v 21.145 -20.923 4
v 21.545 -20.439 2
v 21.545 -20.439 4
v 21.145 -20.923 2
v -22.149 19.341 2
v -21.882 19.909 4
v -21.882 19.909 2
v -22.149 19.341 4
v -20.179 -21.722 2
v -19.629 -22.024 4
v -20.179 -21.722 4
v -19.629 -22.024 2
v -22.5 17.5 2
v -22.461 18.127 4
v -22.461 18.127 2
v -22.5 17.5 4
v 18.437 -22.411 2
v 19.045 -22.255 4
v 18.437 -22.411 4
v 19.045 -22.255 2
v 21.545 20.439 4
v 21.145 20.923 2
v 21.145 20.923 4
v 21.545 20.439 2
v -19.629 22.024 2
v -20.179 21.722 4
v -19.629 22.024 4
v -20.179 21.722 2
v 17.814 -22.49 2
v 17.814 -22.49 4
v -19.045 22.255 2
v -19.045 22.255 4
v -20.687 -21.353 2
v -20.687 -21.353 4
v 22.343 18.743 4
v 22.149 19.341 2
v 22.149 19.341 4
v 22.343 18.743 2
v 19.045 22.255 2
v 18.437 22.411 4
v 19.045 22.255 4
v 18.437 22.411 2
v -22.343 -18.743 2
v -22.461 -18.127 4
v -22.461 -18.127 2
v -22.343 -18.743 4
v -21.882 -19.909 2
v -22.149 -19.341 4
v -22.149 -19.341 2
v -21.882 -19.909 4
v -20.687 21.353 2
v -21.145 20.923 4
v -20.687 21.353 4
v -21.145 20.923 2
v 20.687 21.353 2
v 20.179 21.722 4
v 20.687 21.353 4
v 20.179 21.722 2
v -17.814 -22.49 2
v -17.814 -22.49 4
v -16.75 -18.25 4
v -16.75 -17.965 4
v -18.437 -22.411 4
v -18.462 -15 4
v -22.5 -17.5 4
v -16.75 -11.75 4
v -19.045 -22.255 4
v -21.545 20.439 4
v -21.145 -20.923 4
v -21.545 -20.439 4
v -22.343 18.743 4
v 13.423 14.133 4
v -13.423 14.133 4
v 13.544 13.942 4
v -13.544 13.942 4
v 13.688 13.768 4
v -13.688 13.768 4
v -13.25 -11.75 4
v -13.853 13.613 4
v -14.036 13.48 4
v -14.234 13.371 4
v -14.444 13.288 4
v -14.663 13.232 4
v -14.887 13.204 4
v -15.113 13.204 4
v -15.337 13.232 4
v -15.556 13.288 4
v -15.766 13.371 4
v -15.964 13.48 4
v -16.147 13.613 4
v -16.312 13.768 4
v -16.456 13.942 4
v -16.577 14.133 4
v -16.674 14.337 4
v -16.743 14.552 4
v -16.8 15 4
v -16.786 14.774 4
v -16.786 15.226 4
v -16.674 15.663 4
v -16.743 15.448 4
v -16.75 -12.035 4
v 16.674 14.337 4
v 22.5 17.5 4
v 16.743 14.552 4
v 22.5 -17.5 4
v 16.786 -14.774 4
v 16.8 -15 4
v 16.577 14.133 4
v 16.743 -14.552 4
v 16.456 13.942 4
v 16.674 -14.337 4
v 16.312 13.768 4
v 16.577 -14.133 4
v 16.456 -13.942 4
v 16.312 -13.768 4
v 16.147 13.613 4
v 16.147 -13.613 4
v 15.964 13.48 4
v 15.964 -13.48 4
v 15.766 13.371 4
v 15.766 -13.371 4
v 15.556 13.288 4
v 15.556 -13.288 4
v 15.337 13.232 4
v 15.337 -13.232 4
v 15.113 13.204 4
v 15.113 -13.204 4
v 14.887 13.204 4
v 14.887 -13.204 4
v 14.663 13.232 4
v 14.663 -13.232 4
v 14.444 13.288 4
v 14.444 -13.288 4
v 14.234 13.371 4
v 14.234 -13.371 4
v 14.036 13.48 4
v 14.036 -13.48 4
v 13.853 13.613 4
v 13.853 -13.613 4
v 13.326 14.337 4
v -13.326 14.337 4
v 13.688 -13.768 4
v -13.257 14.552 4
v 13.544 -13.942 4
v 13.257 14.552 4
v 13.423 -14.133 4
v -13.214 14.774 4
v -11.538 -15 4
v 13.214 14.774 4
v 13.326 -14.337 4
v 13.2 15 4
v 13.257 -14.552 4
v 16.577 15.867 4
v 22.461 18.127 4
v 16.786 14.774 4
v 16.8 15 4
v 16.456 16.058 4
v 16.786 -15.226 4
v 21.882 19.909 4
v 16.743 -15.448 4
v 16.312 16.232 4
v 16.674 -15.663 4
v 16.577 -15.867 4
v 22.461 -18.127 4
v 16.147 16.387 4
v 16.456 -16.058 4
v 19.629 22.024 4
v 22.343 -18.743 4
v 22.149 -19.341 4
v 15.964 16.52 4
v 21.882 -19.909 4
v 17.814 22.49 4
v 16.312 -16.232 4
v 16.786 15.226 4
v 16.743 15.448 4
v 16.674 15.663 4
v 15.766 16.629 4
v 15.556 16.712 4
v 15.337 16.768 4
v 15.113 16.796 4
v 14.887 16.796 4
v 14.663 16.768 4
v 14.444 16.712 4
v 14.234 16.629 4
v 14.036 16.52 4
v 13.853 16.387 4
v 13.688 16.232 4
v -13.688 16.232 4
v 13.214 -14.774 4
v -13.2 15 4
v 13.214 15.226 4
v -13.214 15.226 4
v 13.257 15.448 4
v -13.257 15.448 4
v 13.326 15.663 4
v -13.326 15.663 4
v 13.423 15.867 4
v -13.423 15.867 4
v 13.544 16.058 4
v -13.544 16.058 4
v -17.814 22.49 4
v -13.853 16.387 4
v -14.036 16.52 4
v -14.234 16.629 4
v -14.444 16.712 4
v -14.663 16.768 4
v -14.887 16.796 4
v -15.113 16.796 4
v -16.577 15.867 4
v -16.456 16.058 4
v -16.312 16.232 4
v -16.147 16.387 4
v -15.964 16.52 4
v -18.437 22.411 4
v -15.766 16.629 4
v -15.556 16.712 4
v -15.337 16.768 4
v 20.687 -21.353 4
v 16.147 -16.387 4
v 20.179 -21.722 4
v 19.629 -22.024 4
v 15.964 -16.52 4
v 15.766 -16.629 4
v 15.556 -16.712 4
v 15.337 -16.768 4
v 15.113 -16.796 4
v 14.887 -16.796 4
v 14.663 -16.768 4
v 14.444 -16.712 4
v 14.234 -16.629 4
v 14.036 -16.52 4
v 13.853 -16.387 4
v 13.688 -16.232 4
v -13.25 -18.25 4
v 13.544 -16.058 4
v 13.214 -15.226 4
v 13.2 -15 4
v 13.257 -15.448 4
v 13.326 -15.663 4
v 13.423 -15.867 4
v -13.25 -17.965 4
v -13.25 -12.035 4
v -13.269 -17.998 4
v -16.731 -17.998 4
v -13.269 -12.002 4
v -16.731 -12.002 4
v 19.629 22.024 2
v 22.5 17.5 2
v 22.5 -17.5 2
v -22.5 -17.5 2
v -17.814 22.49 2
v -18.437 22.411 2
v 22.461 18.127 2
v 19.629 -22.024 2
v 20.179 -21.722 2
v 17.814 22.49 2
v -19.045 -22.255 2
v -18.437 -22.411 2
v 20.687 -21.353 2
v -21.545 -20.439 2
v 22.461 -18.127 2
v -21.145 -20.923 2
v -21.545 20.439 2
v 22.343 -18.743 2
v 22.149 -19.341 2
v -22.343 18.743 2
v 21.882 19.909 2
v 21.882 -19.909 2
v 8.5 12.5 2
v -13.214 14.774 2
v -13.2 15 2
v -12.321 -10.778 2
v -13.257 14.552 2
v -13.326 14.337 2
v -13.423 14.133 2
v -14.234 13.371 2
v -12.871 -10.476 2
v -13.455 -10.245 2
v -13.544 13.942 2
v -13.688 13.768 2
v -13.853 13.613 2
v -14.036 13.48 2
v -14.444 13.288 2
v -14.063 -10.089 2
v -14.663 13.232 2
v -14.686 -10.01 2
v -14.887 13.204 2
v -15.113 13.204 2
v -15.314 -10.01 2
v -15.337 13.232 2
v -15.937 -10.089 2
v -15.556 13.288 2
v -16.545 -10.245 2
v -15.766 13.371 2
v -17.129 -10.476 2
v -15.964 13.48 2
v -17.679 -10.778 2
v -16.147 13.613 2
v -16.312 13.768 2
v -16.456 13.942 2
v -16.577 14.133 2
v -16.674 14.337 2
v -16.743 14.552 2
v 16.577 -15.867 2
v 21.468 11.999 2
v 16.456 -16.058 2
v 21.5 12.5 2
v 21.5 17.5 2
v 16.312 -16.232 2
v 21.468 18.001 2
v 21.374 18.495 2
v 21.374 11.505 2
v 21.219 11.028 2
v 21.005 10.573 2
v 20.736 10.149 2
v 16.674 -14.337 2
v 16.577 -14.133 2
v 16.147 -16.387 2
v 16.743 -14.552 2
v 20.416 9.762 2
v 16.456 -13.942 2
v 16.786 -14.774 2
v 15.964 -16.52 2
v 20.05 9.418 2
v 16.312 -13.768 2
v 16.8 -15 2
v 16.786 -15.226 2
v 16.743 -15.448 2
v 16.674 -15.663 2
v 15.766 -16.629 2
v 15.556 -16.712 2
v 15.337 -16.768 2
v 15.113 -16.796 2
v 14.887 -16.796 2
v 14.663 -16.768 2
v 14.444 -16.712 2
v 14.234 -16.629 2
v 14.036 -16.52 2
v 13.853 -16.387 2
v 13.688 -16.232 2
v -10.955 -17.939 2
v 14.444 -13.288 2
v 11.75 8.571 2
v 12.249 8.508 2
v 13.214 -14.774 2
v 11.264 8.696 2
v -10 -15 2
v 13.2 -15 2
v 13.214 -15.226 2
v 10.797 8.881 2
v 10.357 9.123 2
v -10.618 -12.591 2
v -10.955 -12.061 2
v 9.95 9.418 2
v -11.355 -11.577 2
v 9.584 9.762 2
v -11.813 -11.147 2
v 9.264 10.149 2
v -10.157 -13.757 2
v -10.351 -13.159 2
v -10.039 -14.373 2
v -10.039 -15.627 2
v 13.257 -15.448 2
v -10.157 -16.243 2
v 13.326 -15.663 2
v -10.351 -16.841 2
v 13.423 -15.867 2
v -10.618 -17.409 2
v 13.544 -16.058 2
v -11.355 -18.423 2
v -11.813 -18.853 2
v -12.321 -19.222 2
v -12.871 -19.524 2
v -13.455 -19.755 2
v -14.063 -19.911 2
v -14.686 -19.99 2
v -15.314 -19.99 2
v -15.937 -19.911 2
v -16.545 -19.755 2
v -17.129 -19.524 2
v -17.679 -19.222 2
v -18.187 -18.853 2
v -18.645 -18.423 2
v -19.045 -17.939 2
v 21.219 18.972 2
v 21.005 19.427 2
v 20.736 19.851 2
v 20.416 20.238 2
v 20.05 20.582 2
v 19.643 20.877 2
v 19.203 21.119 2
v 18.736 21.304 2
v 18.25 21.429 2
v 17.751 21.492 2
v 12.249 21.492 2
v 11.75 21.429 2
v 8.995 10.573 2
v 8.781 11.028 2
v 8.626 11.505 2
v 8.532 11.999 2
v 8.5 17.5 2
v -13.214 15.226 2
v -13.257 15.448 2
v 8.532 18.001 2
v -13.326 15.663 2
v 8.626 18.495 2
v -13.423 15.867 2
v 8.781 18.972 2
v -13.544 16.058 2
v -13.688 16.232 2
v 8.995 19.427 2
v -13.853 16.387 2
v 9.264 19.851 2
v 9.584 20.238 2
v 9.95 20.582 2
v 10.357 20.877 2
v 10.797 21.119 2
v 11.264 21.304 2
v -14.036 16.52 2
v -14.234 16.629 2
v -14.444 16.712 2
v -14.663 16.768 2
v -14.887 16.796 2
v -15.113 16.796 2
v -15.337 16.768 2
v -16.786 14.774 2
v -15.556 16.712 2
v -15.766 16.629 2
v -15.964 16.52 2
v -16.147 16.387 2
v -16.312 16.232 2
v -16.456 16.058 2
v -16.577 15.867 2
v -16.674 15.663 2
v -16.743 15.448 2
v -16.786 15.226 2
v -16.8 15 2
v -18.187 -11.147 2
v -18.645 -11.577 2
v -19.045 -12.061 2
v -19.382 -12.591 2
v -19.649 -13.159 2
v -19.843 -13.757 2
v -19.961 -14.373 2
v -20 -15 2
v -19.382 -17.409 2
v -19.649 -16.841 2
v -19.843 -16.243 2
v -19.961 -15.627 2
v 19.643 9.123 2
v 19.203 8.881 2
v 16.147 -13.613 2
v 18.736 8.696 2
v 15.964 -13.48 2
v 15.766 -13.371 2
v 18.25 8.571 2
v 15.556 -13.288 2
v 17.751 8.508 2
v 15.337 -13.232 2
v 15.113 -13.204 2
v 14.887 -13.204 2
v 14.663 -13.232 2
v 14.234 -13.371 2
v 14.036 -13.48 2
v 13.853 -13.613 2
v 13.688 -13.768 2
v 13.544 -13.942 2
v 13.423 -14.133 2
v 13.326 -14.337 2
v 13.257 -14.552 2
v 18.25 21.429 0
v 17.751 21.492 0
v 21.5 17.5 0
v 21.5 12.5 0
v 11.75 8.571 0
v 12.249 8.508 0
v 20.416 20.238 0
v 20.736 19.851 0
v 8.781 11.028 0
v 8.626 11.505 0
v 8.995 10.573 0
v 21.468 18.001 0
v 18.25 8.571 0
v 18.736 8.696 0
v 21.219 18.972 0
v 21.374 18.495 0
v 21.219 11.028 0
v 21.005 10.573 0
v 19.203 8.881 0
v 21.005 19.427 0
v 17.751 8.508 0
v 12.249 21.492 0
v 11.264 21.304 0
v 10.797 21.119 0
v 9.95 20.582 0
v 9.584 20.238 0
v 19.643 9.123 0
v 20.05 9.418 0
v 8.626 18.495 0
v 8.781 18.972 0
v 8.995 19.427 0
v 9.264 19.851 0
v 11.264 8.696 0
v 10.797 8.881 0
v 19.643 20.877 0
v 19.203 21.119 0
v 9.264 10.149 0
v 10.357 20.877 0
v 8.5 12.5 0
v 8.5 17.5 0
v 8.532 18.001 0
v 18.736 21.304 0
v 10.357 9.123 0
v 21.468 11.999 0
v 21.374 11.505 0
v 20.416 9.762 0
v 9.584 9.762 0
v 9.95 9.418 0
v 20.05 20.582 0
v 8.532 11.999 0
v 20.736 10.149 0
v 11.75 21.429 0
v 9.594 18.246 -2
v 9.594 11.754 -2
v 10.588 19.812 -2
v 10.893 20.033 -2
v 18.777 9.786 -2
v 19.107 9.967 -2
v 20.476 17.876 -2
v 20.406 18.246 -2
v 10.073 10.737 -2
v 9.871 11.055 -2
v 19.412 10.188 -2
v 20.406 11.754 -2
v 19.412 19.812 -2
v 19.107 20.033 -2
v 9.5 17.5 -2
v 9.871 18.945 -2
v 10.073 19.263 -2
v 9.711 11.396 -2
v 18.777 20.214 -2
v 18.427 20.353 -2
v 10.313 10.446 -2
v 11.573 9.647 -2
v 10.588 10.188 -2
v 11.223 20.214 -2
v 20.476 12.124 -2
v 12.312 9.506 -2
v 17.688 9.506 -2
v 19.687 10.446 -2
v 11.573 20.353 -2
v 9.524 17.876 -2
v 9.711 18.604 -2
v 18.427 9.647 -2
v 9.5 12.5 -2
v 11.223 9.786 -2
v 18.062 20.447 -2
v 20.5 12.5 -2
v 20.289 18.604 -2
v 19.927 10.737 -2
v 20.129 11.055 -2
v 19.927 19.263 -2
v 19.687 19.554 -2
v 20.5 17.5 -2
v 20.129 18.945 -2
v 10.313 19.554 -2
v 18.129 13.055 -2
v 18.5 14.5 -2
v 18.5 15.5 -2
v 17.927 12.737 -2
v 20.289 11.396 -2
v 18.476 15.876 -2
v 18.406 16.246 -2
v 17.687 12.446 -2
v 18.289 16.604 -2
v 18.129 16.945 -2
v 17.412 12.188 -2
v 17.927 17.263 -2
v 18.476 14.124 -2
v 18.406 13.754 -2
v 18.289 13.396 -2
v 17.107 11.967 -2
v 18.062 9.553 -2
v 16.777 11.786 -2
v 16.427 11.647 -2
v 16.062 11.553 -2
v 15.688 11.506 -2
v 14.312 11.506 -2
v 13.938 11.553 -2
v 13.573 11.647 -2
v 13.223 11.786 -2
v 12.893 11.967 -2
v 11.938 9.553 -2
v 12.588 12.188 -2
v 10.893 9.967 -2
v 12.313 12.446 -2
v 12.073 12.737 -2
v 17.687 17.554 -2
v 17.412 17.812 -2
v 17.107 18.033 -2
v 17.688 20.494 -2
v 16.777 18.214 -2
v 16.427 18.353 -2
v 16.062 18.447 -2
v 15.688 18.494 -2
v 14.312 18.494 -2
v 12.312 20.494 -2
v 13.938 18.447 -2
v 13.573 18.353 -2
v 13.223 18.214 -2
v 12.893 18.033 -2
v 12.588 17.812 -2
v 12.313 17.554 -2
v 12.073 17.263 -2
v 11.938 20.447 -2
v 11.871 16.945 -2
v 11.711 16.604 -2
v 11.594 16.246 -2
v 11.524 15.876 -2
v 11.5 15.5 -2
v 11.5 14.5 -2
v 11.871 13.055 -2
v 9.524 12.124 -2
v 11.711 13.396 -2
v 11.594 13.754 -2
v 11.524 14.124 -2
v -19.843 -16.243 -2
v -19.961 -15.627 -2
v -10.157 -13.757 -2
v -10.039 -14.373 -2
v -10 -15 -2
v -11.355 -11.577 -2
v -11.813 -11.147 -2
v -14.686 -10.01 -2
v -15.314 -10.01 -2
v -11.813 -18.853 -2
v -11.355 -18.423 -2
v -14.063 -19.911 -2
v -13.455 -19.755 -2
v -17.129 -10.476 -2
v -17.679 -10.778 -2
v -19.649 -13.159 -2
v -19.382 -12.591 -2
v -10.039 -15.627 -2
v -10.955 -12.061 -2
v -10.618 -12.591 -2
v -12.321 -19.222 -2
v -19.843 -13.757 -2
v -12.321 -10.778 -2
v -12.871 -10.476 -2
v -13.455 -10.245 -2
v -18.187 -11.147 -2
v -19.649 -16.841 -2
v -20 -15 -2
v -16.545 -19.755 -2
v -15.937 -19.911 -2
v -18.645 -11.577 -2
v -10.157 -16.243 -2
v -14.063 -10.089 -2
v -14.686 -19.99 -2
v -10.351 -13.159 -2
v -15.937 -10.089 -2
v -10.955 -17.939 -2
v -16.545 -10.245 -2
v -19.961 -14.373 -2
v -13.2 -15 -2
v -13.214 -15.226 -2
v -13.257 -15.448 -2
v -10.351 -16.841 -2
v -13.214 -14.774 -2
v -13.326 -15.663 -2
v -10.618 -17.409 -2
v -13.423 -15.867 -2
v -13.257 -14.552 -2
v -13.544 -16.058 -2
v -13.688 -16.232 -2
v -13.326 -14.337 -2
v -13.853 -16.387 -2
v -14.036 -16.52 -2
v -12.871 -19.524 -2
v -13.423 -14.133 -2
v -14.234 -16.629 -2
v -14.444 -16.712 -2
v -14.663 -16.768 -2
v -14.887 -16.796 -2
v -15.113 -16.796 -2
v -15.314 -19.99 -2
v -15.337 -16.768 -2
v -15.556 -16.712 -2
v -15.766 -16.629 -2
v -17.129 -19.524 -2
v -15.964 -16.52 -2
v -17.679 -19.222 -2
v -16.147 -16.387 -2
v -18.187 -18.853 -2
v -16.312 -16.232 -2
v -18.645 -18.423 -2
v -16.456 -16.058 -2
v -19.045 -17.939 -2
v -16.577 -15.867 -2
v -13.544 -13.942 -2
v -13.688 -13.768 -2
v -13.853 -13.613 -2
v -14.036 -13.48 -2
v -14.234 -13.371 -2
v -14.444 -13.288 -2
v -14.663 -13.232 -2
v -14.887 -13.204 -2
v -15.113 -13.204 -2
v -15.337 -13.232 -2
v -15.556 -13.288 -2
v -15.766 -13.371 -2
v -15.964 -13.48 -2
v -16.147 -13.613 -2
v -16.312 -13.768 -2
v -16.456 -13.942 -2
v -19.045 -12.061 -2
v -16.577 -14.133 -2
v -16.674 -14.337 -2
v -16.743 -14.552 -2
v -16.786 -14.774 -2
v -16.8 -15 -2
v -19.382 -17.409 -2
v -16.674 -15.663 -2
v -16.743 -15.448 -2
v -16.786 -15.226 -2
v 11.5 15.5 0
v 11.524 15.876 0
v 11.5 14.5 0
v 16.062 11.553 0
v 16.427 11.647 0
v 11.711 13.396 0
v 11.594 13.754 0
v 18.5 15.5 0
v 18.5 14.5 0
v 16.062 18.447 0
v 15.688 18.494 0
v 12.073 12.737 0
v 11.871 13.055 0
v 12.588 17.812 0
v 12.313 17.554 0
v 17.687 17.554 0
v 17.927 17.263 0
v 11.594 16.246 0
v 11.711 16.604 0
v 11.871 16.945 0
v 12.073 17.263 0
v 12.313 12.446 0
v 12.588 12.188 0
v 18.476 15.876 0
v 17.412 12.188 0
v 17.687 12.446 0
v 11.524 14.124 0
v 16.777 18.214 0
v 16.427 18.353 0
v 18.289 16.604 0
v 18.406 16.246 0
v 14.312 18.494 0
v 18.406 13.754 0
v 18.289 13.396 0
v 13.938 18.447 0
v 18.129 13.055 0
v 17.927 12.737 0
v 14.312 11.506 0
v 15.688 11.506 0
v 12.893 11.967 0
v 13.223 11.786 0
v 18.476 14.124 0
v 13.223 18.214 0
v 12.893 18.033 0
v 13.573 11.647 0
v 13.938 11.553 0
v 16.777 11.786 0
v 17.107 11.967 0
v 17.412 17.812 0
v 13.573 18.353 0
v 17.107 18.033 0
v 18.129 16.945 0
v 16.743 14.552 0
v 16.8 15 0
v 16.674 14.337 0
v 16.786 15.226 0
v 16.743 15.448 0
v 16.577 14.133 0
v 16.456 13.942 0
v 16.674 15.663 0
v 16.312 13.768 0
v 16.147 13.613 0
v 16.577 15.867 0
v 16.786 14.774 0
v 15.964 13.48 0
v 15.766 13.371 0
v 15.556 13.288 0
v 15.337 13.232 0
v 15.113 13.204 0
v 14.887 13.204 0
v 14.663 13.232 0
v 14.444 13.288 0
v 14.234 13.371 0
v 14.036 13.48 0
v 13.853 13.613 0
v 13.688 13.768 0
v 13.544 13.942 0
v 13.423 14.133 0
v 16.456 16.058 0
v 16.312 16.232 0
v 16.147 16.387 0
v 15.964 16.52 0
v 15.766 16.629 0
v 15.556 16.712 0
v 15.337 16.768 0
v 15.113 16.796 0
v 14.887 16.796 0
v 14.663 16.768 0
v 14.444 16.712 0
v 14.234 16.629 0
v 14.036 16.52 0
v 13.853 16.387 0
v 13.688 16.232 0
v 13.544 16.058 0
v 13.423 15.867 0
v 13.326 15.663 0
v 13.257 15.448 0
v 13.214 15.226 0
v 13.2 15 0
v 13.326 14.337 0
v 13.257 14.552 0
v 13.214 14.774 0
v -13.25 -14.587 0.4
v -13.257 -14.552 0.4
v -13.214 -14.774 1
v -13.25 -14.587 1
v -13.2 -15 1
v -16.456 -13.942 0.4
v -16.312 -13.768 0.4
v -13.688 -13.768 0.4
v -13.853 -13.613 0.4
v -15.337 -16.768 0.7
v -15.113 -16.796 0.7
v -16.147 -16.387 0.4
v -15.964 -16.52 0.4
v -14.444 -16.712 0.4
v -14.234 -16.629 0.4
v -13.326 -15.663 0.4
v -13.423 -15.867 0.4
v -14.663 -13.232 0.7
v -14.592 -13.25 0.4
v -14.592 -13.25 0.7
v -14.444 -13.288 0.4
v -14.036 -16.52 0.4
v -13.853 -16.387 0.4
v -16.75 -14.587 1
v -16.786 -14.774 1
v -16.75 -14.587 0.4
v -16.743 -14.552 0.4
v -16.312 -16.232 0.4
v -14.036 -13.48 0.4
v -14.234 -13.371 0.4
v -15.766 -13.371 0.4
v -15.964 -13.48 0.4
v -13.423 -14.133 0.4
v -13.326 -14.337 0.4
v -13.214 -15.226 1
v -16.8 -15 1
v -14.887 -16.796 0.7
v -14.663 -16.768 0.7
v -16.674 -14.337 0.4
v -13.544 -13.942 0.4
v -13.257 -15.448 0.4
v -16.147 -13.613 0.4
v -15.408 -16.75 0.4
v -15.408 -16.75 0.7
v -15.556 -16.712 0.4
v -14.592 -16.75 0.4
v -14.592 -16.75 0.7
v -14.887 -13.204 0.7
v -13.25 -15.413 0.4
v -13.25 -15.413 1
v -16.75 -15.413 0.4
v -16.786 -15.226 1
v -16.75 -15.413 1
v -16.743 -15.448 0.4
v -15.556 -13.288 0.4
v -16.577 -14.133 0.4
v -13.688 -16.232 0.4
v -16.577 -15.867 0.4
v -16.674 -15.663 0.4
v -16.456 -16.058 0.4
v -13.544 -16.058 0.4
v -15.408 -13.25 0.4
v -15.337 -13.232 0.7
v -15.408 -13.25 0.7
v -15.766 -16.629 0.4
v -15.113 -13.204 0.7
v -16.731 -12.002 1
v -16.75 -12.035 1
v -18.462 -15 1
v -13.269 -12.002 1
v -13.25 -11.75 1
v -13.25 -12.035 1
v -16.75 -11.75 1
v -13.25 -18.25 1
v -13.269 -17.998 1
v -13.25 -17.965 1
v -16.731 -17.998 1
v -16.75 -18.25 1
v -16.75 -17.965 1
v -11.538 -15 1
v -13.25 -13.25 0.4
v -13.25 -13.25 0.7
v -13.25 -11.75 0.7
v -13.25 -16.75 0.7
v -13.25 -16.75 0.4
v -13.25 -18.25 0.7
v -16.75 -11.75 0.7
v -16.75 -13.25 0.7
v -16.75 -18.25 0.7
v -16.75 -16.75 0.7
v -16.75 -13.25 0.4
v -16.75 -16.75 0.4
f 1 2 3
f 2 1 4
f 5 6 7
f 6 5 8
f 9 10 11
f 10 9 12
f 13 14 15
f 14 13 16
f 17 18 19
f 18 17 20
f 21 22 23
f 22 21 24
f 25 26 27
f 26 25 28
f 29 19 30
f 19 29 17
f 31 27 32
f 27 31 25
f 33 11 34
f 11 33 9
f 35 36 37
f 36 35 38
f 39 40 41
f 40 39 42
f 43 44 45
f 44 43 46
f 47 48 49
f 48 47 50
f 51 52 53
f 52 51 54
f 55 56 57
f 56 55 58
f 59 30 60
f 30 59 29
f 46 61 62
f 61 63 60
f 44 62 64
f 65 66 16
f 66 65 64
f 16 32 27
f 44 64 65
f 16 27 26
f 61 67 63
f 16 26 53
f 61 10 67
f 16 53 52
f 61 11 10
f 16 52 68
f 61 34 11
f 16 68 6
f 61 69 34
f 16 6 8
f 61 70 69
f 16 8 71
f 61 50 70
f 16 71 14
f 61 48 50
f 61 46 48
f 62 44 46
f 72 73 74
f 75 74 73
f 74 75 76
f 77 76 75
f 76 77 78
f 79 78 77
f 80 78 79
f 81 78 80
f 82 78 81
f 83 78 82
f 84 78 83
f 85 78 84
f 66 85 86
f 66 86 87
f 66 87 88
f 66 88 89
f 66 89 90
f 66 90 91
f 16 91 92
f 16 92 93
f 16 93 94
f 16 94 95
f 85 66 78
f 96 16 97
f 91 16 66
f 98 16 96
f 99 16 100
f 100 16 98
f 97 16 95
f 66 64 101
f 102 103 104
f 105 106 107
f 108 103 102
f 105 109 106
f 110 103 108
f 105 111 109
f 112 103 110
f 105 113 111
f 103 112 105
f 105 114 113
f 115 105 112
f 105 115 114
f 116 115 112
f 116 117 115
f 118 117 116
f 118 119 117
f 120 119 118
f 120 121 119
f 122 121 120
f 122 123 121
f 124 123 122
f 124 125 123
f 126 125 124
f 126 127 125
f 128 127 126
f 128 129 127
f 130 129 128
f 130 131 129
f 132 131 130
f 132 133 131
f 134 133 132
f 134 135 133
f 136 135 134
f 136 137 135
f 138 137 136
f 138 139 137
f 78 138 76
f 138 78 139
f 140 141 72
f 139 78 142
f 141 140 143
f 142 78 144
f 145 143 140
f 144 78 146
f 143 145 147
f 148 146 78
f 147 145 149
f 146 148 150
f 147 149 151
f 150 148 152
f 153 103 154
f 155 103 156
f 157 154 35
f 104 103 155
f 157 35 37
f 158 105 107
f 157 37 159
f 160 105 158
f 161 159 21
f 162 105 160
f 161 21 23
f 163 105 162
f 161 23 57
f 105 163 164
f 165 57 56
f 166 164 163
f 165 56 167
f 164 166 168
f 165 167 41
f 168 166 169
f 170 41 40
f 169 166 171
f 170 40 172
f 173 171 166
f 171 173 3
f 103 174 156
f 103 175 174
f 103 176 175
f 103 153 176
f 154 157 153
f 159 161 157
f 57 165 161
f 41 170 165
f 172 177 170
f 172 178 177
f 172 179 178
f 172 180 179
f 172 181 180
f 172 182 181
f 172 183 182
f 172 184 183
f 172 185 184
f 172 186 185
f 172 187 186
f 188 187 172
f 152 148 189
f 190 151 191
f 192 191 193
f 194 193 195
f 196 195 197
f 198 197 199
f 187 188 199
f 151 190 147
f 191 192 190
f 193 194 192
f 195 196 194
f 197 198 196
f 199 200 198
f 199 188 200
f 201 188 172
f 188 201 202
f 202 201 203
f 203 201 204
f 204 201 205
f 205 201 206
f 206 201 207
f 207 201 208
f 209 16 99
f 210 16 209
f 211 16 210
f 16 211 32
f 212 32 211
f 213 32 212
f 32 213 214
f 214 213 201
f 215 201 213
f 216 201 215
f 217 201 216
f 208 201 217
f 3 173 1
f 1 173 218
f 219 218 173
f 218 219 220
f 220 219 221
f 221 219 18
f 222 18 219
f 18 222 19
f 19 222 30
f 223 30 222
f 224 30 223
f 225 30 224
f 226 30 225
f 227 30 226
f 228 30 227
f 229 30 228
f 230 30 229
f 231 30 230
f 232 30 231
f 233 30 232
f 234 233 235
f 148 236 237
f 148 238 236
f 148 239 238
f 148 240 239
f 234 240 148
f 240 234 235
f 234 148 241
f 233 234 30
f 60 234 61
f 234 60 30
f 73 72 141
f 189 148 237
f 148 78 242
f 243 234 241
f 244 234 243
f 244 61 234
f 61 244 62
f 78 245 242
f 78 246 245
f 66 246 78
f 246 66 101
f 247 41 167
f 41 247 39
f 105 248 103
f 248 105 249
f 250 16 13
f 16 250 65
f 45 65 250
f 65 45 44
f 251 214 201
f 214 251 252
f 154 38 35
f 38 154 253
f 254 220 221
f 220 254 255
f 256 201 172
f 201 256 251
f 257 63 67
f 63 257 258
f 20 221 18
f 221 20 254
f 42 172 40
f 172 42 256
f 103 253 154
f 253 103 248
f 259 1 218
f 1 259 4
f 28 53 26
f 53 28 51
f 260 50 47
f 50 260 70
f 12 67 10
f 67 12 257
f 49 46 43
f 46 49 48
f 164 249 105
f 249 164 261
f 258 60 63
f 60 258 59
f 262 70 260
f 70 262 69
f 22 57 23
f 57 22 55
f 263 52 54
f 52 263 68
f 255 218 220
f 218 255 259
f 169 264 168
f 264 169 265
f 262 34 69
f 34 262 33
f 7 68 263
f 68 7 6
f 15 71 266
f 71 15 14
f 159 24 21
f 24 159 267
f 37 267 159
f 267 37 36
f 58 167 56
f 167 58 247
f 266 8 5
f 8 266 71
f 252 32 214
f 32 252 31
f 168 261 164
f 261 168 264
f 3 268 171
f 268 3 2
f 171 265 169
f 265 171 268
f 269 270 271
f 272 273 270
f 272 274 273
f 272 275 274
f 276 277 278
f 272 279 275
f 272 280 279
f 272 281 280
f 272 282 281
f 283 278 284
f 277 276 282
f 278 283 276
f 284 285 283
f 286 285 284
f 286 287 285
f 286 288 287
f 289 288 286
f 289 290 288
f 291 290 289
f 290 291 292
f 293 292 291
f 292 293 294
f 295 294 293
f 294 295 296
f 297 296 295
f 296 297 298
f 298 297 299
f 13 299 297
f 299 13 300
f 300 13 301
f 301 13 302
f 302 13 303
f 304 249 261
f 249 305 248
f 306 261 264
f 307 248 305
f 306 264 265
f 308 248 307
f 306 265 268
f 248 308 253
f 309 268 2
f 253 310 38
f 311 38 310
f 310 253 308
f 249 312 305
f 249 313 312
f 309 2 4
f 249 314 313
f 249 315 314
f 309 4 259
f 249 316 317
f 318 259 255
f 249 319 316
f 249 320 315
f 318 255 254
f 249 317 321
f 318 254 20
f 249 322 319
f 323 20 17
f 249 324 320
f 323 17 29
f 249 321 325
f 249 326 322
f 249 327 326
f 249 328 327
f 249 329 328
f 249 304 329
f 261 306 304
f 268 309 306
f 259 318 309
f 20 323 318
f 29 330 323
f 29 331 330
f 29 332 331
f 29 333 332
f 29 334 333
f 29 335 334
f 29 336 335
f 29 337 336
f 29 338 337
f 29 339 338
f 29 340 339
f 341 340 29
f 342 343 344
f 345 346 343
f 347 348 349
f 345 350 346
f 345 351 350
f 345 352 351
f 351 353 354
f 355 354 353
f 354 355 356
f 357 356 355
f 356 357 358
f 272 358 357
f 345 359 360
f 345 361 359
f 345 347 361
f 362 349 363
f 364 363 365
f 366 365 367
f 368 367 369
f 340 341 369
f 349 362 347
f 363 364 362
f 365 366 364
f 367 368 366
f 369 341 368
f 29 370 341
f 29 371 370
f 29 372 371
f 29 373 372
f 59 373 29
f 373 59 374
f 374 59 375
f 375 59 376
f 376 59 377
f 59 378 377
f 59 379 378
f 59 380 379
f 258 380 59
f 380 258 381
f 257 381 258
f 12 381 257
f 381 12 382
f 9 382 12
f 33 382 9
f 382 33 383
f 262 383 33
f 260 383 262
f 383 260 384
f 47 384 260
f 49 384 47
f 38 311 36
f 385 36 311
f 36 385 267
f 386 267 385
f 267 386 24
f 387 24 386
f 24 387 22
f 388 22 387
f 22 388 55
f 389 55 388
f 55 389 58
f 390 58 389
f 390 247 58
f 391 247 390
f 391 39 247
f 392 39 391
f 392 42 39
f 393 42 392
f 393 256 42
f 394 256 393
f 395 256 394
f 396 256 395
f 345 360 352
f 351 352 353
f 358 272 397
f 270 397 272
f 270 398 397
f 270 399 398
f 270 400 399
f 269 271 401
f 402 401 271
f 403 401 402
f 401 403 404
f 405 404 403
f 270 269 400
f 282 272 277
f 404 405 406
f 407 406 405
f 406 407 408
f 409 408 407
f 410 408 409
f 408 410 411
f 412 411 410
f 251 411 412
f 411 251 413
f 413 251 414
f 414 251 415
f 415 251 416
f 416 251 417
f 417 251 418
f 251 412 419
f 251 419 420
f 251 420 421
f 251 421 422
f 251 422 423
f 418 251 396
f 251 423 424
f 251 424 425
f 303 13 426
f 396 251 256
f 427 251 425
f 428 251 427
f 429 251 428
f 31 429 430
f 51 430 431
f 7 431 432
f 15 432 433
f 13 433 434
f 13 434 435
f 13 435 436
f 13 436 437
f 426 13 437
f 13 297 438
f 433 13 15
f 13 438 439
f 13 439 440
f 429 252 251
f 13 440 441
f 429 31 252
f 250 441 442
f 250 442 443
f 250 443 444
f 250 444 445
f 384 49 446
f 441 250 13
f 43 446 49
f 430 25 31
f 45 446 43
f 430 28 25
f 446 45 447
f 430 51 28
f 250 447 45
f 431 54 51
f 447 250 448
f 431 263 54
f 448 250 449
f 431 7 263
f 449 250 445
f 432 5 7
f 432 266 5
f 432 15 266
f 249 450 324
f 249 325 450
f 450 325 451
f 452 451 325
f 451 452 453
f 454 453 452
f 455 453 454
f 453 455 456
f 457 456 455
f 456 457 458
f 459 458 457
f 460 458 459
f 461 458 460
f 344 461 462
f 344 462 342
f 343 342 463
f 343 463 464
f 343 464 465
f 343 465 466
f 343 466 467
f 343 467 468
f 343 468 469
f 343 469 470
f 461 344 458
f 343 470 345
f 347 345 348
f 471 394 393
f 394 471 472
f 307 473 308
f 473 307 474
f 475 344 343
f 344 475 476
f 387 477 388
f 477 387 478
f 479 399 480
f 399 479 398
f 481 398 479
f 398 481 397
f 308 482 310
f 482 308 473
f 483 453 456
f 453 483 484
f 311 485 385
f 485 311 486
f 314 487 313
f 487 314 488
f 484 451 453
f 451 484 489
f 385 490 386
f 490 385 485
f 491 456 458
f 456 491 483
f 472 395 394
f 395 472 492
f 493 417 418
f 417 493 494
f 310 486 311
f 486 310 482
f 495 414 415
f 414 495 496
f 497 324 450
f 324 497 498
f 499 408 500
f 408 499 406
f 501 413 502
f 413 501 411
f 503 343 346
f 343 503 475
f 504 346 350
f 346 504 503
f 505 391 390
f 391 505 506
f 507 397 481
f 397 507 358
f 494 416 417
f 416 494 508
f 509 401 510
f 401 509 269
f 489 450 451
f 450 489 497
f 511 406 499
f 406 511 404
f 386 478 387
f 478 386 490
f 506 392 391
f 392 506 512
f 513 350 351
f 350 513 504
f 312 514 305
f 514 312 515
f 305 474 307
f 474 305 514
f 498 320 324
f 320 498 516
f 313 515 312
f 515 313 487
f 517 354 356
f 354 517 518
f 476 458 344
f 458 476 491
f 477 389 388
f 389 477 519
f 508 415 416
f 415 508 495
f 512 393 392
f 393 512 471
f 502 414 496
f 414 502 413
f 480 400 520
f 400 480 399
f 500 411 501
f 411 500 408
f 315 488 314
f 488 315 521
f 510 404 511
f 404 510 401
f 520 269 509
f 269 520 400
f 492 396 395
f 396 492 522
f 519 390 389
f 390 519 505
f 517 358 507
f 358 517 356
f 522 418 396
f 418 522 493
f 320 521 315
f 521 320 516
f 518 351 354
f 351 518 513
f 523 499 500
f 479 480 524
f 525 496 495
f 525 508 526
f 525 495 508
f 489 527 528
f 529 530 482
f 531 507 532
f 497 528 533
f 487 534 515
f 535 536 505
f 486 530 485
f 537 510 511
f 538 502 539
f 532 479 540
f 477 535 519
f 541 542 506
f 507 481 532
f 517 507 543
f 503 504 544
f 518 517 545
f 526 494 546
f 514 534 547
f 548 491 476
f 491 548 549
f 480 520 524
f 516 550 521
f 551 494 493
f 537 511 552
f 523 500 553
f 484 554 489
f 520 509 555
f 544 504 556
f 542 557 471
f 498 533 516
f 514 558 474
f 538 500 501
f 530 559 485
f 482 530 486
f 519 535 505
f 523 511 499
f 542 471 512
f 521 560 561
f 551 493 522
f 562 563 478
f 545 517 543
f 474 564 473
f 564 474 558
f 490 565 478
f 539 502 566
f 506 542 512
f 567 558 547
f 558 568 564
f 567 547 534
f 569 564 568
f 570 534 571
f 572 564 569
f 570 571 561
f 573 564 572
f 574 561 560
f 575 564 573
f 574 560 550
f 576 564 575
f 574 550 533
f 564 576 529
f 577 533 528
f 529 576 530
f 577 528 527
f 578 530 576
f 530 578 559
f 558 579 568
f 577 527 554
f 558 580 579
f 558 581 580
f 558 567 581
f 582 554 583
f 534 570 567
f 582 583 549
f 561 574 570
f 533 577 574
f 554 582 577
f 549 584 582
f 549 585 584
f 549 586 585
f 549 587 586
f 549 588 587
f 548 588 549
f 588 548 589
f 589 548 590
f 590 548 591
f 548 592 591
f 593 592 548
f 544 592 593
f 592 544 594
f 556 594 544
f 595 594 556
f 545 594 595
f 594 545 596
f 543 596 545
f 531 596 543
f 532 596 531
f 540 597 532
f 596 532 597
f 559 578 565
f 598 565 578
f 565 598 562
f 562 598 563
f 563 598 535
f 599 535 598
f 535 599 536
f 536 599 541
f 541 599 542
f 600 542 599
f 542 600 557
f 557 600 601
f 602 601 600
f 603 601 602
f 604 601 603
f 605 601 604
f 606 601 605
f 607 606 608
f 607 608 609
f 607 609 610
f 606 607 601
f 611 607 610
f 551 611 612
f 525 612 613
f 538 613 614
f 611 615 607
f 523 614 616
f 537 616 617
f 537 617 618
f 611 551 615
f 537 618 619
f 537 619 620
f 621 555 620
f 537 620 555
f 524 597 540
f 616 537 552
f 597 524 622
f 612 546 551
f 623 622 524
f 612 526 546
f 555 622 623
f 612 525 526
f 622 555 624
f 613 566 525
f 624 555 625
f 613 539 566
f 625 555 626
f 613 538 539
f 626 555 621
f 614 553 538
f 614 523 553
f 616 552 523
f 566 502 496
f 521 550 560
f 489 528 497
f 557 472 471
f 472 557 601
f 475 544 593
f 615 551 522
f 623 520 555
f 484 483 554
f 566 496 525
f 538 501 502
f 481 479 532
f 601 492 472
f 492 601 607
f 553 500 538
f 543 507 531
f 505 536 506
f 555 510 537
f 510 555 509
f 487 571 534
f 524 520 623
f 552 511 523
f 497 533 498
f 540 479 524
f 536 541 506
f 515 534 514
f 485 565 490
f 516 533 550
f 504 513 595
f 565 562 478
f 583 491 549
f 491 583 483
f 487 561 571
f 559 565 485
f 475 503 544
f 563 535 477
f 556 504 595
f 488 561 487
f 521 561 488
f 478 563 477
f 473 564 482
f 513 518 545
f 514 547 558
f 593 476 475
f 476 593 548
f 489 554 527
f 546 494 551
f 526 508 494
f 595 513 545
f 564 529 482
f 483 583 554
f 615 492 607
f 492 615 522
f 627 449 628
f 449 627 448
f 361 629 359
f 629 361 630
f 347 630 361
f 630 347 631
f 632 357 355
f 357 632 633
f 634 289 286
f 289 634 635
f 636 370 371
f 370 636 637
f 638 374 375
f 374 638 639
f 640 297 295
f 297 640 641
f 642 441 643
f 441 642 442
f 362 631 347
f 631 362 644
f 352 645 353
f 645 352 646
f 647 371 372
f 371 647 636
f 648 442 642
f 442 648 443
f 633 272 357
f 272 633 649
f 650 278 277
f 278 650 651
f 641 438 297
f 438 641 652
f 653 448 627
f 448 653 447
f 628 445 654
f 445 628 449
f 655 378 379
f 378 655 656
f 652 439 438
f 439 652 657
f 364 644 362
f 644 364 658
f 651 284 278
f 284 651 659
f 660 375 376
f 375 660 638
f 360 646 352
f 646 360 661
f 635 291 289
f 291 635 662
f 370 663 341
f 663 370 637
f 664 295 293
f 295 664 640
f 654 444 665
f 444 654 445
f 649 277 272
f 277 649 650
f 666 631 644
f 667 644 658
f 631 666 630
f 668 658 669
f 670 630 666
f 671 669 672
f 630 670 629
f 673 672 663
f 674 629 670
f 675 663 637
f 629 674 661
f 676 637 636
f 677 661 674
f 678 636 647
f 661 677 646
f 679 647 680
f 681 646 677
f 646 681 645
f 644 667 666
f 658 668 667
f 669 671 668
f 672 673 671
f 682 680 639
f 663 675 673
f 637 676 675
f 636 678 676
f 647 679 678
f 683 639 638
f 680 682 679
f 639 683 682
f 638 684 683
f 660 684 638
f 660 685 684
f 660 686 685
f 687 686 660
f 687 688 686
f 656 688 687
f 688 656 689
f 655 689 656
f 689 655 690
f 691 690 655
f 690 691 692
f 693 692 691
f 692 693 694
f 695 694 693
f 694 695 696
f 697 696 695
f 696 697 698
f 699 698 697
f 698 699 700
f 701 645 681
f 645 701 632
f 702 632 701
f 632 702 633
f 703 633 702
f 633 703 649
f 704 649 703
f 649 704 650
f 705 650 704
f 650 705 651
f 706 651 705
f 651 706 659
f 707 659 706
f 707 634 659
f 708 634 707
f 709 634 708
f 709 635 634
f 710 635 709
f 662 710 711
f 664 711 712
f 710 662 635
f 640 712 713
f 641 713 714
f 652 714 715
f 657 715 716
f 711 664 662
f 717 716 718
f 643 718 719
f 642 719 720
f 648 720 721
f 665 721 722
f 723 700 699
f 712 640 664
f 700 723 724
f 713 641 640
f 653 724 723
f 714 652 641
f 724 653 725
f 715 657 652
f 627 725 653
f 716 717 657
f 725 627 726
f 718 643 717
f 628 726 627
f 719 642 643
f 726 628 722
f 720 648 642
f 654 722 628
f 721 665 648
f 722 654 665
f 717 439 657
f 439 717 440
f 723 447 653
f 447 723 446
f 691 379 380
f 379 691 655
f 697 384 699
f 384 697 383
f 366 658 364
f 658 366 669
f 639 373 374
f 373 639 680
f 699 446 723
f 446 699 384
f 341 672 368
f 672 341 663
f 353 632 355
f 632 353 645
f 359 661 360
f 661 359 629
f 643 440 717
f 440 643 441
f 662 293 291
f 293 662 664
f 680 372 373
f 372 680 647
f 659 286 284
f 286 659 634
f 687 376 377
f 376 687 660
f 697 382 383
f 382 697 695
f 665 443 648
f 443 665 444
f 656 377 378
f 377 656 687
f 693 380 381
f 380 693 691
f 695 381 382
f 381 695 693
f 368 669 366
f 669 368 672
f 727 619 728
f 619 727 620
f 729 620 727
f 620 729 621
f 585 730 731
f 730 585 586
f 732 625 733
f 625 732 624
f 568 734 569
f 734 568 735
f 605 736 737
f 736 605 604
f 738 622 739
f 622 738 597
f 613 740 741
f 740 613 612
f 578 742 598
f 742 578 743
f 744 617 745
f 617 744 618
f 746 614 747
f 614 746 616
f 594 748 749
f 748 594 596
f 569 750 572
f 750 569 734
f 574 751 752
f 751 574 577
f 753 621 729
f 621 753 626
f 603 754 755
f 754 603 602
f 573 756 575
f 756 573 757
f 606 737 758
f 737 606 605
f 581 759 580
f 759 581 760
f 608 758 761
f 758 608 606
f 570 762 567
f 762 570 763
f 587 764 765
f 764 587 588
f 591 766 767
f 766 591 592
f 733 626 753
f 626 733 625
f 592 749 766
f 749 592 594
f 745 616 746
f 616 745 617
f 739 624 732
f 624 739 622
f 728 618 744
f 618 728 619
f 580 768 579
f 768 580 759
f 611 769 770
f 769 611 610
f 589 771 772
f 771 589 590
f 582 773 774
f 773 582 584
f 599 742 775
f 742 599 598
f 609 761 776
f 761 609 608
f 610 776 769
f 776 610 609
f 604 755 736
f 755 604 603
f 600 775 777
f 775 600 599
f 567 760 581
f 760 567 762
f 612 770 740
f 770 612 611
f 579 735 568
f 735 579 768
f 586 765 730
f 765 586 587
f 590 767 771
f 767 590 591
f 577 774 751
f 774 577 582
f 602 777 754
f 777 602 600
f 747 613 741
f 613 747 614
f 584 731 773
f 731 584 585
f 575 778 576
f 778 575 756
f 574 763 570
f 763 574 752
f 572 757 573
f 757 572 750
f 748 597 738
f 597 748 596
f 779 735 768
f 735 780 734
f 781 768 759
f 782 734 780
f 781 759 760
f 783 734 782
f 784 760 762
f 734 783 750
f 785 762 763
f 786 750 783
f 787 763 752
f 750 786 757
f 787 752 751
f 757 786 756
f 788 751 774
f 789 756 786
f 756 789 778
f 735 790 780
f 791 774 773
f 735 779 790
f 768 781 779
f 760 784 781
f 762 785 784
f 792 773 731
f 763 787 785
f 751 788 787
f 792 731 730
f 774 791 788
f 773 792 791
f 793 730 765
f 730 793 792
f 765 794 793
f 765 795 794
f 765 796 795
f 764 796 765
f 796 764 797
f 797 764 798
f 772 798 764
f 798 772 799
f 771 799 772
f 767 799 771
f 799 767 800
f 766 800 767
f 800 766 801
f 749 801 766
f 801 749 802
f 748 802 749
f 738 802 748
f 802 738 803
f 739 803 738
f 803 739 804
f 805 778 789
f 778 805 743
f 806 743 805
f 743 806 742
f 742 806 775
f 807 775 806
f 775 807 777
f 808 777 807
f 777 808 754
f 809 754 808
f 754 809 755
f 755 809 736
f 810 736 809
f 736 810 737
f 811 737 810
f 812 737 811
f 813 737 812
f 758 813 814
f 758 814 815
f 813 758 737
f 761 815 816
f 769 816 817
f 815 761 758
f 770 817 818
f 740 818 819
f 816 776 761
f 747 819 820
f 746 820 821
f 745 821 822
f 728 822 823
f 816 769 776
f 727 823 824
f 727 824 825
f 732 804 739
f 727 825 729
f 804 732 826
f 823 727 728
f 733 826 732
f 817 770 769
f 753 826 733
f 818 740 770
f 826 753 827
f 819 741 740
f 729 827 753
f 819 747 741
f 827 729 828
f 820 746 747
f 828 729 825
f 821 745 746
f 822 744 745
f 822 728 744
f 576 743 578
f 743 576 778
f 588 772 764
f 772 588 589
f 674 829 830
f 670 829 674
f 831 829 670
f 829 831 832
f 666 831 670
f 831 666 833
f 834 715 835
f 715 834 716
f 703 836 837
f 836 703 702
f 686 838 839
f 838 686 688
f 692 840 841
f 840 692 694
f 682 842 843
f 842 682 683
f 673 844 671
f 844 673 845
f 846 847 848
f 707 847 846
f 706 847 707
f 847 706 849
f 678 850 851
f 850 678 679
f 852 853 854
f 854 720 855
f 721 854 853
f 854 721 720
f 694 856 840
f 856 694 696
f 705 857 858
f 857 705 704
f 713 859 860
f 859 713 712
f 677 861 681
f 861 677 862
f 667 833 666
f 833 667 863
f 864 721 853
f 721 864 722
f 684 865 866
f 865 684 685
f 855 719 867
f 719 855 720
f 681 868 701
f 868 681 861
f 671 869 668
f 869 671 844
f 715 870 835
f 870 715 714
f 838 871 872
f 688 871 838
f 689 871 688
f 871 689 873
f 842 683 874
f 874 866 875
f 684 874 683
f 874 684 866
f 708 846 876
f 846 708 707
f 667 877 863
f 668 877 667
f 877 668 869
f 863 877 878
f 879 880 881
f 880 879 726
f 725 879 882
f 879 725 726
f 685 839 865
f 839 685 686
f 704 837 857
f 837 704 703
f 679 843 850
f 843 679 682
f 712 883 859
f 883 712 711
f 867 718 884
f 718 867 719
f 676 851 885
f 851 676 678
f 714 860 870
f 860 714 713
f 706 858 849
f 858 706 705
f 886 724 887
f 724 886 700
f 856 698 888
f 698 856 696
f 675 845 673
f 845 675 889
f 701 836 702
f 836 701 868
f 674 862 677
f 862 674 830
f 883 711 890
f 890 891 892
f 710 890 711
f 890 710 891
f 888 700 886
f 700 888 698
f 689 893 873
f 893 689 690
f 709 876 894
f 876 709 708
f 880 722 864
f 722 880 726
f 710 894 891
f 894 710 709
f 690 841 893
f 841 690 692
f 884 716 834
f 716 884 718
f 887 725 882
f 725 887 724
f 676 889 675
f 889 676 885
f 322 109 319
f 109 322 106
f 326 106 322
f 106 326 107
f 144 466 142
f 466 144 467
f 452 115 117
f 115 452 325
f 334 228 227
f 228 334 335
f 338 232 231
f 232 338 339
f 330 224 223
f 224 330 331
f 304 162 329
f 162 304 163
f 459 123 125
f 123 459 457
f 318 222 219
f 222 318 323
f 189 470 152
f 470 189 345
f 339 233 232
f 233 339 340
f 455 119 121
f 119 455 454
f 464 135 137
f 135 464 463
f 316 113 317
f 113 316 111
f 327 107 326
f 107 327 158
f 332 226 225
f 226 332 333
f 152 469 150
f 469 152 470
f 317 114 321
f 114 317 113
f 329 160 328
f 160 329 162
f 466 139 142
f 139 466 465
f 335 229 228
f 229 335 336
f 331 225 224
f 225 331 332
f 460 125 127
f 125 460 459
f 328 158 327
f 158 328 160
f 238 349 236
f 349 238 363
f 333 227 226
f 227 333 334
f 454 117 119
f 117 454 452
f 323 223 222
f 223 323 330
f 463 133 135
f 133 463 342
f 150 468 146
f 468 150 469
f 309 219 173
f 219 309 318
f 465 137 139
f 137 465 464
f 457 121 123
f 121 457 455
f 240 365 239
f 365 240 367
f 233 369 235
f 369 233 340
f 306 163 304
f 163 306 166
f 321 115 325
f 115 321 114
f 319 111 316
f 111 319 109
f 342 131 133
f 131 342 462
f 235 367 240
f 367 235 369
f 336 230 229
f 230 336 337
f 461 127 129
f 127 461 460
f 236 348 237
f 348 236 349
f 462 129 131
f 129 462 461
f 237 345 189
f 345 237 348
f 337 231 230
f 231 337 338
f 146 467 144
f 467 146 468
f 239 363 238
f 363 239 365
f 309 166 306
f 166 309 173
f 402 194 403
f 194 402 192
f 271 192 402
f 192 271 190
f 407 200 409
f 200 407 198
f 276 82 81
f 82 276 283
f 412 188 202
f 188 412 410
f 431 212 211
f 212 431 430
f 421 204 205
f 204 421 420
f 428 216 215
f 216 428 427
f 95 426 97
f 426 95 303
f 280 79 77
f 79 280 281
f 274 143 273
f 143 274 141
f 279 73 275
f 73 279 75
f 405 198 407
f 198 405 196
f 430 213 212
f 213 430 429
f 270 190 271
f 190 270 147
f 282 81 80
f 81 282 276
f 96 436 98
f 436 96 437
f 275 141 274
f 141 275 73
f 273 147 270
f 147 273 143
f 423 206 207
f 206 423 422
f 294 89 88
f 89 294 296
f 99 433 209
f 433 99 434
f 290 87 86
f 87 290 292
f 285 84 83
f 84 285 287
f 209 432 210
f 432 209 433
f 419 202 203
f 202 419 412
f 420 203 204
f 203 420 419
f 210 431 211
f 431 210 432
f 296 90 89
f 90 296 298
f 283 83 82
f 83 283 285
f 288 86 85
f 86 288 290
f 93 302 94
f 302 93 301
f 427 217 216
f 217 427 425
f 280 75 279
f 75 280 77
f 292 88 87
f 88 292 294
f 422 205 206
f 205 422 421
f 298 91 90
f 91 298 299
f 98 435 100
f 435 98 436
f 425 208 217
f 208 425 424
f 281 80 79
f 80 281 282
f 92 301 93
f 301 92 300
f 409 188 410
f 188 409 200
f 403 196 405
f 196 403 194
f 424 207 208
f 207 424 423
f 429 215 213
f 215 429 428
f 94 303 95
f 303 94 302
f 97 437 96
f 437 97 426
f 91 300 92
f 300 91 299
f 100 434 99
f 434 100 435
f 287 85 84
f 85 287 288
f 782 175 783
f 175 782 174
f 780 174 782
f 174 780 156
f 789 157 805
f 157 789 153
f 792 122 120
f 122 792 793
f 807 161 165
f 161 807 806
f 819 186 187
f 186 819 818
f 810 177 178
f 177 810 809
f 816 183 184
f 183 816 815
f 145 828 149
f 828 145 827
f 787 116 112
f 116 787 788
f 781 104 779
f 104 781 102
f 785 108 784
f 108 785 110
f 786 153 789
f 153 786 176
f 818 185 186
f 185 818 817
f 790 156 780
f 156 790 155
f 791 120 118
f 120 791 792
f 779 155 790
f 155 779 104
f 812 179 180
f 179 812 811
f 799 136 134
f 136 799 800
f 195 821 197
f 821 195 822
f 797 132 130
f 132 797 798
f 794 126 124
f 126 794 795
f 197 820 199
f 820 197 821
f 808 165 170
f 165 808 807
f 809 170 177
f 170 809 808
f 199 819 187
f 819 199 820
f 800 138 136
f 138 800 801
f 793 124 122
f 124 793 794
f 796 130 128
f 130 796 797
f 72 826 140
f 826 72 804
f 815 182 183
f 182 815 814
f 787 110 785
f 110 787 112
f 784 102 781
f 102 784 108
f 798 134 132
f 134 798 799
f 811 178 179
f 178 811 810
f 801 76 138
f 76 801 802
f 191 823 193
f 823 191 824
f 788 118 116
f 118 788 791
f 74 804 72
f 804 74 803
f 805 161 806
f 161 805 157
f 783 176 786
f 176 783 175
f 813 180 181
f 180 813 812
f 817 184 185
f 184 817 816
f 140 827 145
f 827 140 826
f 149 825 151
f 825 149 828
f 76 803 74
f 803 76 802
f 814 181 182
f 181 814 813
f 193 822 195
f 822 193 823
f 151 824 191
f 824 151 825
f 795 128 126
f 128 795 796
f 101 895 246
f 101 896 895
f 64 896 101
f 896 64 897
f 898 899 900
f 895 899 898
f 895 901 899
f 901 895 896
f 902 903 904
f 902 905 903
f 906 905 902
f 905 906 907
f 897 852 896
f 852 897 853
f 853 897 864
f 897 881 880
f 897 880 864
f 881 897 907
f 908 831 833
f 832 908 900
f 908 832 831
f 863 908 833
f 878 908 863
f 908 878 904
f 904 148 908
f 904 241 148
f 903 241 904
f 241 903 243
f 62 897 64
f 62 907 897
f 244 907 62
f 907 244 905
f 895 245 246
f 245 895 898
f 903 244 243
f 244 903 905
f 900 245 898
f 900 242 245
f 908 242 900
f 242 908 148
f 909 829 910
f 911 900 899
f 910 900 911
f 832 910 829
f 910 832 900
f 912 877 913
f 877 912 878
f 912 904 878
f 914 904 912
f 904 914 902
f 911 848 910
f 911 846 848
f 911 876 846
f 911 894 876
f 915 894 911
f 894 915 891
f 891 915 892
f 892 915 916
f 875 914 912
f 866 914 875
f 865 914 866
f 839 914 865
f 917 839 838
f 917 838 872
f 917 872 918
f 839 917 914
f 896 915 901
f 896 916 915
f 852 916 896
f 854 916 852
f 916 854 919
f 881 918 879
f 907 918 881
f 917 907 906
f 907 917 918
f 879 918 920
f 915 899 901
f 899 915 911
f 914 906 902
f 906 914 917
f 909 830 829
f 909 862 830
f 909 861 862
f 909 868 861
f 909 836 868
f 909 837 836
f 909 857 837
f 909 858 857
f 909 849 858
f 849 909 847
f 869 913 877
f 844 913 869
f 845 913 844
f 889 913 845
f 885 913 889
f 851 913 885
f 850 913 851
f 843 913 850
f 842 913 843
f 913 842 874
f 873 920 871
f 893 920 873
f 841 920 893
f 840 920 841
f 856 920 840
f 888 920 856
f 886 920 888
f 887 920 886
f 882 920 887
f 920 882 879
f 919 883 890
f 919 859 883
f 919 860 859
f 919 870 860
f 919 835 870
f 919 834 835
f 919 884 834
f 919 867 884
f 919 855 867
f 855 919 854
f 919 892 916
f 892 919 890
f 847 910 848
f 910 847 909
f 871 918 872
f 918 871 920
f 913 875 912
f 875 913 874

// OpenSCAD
$fn = 50;


difference() {
	union() {
		translate(v = [0, 0, 2]) {
			rotate(a = [0, 0, 0]) {
				hull() {
					translate(v = [-17.5000000000, 17.5000000000, 0]) {
						rotate(a = [0, 0, 0]) {
							translate(v = [0, 0, 0]) {
								rotate(a = [0, 0, 0]) {
									cylinder(h = 2, r = 5);
								}
							}
						}
					}
					translate(v = [17.5000000000, 17.5000000000, 0]) {
						rotate(a = [0, 0, 0]) {
							translate(v = [0, 0, 0]) {
								rotate(a = [0, 0, 0]) {
									cylinder(h = 2, r = 5);
								}
							}
						}
					}
					translate(v = [-17.5000000000, -17.5000000000, 0]) {
						rotate(a = [0, 0, 0]) {
							translate(v = [0, 0, 0]) {
								rotate(a = [0, 0, 0]) {
									cylinder(h = 2, r = 5);
								}
							}
						}
					}
					translate(v = [17.5000000000, -17.5000000000, 0]) {
						rotate(a = [0, 0, 0]) {
							translate(v = [0, 0, 0]) {
								rotate(a = [0, 0, 0]) {
									cylinder(h = 2, r = 5);
								}
							}
						}
					}
				}
			}
		}
		translate(v = [15.0000000000, 15.0000000000, 0]) {
			rotate(a = [0, 0, 0]) {
				hull() {
					translate(v = [-2.5000000000, 2.5000000000, 0]) {
						rotate(a = [0, 0, 0]) {
							cylinder(h = 2, r1 = 4.0000000000, r2 = 4.0000000000);
						}
					}
					translate(v = [2.5000000000, 2.5000000000, 0]) {
						rotate(a = [0, 0, 0]) {
							cylinder(h = 2, r1 = 4.0000000000, r2 = 4.0000000000);
						}
					}
					translate(v = [-2.5000000000, -2.5000000000, 0]) {
						rotate(a = [0, 0, 0]) {
							cylinder(h = 2, r1 = 4.0000000000, r2 = 4.0000000000);
						}
					}
					translate(v = [2.5000000000, -2.5000000000, 0]) {
						rotate(a = [0, 0, 0]) {
							cylinder(h = 2, r1 = 4.0000000000, r2 = 4.0000000000);
						}
					}
				}
			}
		}
		translate(v = [15.0000000000, 15.0000000000, -2]) {
			rotate(a = [0, 180, 0]) {
				hull() {
					translate(v = [-2.5000000000, 2.5000000000, 0]) {
						rotate(a = [0, 180, 0]) {
							cylinder(h = 2, r1 = 3.0000000000, r2 = 4.0000000000);
						}
					}
					translate(v = [2.5000000000, 2.5000000000, 0]) {
						rotate(a = [0, 180, 0]) {
							cylinder(h = 2, r1 = 3.0000000000, r2 = 4.0000000000);
						}
					}
					translate(v = [-2.5000000000, -2.5000000000, 0]) {
						rotate(a = [0, 180, 0]) {
							cylinder(h = 2, r1 = 3.0000000000, r2 = 4.0000000000);
						}
					}
					translate(v = [2.5000000000, -2.5000000000, 0]) {
						rotate(a = [0, 180, 0]) {
							cylinder(h = 2, r1 = 3.0000000000, r2 = 4.0000000000);
						}
					}
				}
			}
		}
		translate(v = [-15.0000000000, -15.0000000000, -2.0000000000]) {
			rotate(a = [0, 0, 0]) {
				cylinder(h = 4, r = 5);
			}
		}
	}
	union() {
		translate(v = [15.0000000000, 15.0000000000, -2]) {
			rotate(a = [0, 0, 0]) {
				hull() {
					translate(v = [-0.5000000000, 0.5000000000, 0]) {
						rotate(a = [0, 0, 0]) {
							translate(v = [0, 0, 0]) {
								rotate(a = [0, 0, 0]) {
									cylinder(h = 2, r = 3.0000000000);
								}
							}
						}
					}
					translate(v = [0.5000000000, 0.5000000000, 0]) {
						rotate(a = [0, 0, 0]) {
							translate(v = [0, 0, 0]) {
								rotate(a = [0, 0, 0]) {
									cylinder(h = 2, r = 3.0000000000);
								}
							}
						}
					}
					translate(v = [-0.5000000000, -0.5000000000, 0]) {
						rotate(a = [0, 0, 0]) {
							translate(v = [0, 0, 0]) {
								rotate(a = [0, 0, 0]) {
									cylinder(h = 2, r = 3.0000000000);
								}
							}
						}
					}
					translate(v = [0.5000000000, -0.5000000000, 0]) {
						rotate(a = [0, 0, 0]) {
							translate(v = [0, 0, 0]) {
								rotate(a = [0, 0, 0]) {
									cylinder(h = 2, r = 3.0000000000);
								}
							}
						}
					}
				}
			}
		}
		translate(v = [-15.0000000000, -15.0000000000, -50]) {
			rotate(a = [0, 0, 0]) {
				cylinder(h = 100, r = 1.8000000000);
			}
		}
		translate(v = [15.0000000000, -15.0000000000, -50]) {
			rotate(a = [0, 0, 0]) {
				cylinder(h = 100, r = 1.8000000000);
			}
		}
		translate(v = [-15.0000000000, 15.0000000000, -50]) {
			rotate(a = [0, 0, 0]) {
				cylinder(h = 100, r = 1.8000000000);
			}
		}
		translate(v = [15.0000000000, 15.0000000000, -50]) {
			rotate(a = [0, 0, 0]) {
				cylinder(h = 100, r = 1.8000000000);
			}
		}
		translate(v = [-15.0000000000, -15.0000000000, 1]) {
			rotate(a = [0, 0, 0]) {
				#translate(v = [0, 0, 0]) {
					rotate(a = [0, 0, 0]) {
						linear_extrude(height = 3) {
							polygon(points = [[3.4620000000, 0.0000000000], [1.7310000000, 2.9981799479], [-1.7310000000, 2.9981799479], [-3.4620000000, 0.0000000000], [-1.7310000000, -2.9981799479], [1.7310000000, -2.9981799479]]);
						}
					}
				}
			}
		}
		#translate(v = [-16.7500000000, -18.2500000000, 4]) {
			rotate(a = [0, 0, 0]) {
				cube(size = [3.5000000000, 6.5000000000, 0.3000000000]);
			}
		}
		#translate(v = [-16.7500000000, -16.7500000000, 4.3000000000]) {
			rotate(a = [0, 0, 0]) {
				cube(size = [3.5000000000, 3.5000000000, 0.3000000000]);
			}
		}
		#translate(v = [-16.7500000000, -18.2500000000, 0.7000000000]) {
			rotate(a = [0, 0, 0]) {
				cube(size = [3.5000000000, 6.5000000000, 0.3000000000]);
			}
		}
		#translate(v = [-16.7500000000, -16.7500000000, 0.4000000000]) {
			rotate(a = [0, 0, 0]) {
				cube(size = [3.5000000000, 3.5000000000, 0.3000000000]);
			}
		}
	}
}
